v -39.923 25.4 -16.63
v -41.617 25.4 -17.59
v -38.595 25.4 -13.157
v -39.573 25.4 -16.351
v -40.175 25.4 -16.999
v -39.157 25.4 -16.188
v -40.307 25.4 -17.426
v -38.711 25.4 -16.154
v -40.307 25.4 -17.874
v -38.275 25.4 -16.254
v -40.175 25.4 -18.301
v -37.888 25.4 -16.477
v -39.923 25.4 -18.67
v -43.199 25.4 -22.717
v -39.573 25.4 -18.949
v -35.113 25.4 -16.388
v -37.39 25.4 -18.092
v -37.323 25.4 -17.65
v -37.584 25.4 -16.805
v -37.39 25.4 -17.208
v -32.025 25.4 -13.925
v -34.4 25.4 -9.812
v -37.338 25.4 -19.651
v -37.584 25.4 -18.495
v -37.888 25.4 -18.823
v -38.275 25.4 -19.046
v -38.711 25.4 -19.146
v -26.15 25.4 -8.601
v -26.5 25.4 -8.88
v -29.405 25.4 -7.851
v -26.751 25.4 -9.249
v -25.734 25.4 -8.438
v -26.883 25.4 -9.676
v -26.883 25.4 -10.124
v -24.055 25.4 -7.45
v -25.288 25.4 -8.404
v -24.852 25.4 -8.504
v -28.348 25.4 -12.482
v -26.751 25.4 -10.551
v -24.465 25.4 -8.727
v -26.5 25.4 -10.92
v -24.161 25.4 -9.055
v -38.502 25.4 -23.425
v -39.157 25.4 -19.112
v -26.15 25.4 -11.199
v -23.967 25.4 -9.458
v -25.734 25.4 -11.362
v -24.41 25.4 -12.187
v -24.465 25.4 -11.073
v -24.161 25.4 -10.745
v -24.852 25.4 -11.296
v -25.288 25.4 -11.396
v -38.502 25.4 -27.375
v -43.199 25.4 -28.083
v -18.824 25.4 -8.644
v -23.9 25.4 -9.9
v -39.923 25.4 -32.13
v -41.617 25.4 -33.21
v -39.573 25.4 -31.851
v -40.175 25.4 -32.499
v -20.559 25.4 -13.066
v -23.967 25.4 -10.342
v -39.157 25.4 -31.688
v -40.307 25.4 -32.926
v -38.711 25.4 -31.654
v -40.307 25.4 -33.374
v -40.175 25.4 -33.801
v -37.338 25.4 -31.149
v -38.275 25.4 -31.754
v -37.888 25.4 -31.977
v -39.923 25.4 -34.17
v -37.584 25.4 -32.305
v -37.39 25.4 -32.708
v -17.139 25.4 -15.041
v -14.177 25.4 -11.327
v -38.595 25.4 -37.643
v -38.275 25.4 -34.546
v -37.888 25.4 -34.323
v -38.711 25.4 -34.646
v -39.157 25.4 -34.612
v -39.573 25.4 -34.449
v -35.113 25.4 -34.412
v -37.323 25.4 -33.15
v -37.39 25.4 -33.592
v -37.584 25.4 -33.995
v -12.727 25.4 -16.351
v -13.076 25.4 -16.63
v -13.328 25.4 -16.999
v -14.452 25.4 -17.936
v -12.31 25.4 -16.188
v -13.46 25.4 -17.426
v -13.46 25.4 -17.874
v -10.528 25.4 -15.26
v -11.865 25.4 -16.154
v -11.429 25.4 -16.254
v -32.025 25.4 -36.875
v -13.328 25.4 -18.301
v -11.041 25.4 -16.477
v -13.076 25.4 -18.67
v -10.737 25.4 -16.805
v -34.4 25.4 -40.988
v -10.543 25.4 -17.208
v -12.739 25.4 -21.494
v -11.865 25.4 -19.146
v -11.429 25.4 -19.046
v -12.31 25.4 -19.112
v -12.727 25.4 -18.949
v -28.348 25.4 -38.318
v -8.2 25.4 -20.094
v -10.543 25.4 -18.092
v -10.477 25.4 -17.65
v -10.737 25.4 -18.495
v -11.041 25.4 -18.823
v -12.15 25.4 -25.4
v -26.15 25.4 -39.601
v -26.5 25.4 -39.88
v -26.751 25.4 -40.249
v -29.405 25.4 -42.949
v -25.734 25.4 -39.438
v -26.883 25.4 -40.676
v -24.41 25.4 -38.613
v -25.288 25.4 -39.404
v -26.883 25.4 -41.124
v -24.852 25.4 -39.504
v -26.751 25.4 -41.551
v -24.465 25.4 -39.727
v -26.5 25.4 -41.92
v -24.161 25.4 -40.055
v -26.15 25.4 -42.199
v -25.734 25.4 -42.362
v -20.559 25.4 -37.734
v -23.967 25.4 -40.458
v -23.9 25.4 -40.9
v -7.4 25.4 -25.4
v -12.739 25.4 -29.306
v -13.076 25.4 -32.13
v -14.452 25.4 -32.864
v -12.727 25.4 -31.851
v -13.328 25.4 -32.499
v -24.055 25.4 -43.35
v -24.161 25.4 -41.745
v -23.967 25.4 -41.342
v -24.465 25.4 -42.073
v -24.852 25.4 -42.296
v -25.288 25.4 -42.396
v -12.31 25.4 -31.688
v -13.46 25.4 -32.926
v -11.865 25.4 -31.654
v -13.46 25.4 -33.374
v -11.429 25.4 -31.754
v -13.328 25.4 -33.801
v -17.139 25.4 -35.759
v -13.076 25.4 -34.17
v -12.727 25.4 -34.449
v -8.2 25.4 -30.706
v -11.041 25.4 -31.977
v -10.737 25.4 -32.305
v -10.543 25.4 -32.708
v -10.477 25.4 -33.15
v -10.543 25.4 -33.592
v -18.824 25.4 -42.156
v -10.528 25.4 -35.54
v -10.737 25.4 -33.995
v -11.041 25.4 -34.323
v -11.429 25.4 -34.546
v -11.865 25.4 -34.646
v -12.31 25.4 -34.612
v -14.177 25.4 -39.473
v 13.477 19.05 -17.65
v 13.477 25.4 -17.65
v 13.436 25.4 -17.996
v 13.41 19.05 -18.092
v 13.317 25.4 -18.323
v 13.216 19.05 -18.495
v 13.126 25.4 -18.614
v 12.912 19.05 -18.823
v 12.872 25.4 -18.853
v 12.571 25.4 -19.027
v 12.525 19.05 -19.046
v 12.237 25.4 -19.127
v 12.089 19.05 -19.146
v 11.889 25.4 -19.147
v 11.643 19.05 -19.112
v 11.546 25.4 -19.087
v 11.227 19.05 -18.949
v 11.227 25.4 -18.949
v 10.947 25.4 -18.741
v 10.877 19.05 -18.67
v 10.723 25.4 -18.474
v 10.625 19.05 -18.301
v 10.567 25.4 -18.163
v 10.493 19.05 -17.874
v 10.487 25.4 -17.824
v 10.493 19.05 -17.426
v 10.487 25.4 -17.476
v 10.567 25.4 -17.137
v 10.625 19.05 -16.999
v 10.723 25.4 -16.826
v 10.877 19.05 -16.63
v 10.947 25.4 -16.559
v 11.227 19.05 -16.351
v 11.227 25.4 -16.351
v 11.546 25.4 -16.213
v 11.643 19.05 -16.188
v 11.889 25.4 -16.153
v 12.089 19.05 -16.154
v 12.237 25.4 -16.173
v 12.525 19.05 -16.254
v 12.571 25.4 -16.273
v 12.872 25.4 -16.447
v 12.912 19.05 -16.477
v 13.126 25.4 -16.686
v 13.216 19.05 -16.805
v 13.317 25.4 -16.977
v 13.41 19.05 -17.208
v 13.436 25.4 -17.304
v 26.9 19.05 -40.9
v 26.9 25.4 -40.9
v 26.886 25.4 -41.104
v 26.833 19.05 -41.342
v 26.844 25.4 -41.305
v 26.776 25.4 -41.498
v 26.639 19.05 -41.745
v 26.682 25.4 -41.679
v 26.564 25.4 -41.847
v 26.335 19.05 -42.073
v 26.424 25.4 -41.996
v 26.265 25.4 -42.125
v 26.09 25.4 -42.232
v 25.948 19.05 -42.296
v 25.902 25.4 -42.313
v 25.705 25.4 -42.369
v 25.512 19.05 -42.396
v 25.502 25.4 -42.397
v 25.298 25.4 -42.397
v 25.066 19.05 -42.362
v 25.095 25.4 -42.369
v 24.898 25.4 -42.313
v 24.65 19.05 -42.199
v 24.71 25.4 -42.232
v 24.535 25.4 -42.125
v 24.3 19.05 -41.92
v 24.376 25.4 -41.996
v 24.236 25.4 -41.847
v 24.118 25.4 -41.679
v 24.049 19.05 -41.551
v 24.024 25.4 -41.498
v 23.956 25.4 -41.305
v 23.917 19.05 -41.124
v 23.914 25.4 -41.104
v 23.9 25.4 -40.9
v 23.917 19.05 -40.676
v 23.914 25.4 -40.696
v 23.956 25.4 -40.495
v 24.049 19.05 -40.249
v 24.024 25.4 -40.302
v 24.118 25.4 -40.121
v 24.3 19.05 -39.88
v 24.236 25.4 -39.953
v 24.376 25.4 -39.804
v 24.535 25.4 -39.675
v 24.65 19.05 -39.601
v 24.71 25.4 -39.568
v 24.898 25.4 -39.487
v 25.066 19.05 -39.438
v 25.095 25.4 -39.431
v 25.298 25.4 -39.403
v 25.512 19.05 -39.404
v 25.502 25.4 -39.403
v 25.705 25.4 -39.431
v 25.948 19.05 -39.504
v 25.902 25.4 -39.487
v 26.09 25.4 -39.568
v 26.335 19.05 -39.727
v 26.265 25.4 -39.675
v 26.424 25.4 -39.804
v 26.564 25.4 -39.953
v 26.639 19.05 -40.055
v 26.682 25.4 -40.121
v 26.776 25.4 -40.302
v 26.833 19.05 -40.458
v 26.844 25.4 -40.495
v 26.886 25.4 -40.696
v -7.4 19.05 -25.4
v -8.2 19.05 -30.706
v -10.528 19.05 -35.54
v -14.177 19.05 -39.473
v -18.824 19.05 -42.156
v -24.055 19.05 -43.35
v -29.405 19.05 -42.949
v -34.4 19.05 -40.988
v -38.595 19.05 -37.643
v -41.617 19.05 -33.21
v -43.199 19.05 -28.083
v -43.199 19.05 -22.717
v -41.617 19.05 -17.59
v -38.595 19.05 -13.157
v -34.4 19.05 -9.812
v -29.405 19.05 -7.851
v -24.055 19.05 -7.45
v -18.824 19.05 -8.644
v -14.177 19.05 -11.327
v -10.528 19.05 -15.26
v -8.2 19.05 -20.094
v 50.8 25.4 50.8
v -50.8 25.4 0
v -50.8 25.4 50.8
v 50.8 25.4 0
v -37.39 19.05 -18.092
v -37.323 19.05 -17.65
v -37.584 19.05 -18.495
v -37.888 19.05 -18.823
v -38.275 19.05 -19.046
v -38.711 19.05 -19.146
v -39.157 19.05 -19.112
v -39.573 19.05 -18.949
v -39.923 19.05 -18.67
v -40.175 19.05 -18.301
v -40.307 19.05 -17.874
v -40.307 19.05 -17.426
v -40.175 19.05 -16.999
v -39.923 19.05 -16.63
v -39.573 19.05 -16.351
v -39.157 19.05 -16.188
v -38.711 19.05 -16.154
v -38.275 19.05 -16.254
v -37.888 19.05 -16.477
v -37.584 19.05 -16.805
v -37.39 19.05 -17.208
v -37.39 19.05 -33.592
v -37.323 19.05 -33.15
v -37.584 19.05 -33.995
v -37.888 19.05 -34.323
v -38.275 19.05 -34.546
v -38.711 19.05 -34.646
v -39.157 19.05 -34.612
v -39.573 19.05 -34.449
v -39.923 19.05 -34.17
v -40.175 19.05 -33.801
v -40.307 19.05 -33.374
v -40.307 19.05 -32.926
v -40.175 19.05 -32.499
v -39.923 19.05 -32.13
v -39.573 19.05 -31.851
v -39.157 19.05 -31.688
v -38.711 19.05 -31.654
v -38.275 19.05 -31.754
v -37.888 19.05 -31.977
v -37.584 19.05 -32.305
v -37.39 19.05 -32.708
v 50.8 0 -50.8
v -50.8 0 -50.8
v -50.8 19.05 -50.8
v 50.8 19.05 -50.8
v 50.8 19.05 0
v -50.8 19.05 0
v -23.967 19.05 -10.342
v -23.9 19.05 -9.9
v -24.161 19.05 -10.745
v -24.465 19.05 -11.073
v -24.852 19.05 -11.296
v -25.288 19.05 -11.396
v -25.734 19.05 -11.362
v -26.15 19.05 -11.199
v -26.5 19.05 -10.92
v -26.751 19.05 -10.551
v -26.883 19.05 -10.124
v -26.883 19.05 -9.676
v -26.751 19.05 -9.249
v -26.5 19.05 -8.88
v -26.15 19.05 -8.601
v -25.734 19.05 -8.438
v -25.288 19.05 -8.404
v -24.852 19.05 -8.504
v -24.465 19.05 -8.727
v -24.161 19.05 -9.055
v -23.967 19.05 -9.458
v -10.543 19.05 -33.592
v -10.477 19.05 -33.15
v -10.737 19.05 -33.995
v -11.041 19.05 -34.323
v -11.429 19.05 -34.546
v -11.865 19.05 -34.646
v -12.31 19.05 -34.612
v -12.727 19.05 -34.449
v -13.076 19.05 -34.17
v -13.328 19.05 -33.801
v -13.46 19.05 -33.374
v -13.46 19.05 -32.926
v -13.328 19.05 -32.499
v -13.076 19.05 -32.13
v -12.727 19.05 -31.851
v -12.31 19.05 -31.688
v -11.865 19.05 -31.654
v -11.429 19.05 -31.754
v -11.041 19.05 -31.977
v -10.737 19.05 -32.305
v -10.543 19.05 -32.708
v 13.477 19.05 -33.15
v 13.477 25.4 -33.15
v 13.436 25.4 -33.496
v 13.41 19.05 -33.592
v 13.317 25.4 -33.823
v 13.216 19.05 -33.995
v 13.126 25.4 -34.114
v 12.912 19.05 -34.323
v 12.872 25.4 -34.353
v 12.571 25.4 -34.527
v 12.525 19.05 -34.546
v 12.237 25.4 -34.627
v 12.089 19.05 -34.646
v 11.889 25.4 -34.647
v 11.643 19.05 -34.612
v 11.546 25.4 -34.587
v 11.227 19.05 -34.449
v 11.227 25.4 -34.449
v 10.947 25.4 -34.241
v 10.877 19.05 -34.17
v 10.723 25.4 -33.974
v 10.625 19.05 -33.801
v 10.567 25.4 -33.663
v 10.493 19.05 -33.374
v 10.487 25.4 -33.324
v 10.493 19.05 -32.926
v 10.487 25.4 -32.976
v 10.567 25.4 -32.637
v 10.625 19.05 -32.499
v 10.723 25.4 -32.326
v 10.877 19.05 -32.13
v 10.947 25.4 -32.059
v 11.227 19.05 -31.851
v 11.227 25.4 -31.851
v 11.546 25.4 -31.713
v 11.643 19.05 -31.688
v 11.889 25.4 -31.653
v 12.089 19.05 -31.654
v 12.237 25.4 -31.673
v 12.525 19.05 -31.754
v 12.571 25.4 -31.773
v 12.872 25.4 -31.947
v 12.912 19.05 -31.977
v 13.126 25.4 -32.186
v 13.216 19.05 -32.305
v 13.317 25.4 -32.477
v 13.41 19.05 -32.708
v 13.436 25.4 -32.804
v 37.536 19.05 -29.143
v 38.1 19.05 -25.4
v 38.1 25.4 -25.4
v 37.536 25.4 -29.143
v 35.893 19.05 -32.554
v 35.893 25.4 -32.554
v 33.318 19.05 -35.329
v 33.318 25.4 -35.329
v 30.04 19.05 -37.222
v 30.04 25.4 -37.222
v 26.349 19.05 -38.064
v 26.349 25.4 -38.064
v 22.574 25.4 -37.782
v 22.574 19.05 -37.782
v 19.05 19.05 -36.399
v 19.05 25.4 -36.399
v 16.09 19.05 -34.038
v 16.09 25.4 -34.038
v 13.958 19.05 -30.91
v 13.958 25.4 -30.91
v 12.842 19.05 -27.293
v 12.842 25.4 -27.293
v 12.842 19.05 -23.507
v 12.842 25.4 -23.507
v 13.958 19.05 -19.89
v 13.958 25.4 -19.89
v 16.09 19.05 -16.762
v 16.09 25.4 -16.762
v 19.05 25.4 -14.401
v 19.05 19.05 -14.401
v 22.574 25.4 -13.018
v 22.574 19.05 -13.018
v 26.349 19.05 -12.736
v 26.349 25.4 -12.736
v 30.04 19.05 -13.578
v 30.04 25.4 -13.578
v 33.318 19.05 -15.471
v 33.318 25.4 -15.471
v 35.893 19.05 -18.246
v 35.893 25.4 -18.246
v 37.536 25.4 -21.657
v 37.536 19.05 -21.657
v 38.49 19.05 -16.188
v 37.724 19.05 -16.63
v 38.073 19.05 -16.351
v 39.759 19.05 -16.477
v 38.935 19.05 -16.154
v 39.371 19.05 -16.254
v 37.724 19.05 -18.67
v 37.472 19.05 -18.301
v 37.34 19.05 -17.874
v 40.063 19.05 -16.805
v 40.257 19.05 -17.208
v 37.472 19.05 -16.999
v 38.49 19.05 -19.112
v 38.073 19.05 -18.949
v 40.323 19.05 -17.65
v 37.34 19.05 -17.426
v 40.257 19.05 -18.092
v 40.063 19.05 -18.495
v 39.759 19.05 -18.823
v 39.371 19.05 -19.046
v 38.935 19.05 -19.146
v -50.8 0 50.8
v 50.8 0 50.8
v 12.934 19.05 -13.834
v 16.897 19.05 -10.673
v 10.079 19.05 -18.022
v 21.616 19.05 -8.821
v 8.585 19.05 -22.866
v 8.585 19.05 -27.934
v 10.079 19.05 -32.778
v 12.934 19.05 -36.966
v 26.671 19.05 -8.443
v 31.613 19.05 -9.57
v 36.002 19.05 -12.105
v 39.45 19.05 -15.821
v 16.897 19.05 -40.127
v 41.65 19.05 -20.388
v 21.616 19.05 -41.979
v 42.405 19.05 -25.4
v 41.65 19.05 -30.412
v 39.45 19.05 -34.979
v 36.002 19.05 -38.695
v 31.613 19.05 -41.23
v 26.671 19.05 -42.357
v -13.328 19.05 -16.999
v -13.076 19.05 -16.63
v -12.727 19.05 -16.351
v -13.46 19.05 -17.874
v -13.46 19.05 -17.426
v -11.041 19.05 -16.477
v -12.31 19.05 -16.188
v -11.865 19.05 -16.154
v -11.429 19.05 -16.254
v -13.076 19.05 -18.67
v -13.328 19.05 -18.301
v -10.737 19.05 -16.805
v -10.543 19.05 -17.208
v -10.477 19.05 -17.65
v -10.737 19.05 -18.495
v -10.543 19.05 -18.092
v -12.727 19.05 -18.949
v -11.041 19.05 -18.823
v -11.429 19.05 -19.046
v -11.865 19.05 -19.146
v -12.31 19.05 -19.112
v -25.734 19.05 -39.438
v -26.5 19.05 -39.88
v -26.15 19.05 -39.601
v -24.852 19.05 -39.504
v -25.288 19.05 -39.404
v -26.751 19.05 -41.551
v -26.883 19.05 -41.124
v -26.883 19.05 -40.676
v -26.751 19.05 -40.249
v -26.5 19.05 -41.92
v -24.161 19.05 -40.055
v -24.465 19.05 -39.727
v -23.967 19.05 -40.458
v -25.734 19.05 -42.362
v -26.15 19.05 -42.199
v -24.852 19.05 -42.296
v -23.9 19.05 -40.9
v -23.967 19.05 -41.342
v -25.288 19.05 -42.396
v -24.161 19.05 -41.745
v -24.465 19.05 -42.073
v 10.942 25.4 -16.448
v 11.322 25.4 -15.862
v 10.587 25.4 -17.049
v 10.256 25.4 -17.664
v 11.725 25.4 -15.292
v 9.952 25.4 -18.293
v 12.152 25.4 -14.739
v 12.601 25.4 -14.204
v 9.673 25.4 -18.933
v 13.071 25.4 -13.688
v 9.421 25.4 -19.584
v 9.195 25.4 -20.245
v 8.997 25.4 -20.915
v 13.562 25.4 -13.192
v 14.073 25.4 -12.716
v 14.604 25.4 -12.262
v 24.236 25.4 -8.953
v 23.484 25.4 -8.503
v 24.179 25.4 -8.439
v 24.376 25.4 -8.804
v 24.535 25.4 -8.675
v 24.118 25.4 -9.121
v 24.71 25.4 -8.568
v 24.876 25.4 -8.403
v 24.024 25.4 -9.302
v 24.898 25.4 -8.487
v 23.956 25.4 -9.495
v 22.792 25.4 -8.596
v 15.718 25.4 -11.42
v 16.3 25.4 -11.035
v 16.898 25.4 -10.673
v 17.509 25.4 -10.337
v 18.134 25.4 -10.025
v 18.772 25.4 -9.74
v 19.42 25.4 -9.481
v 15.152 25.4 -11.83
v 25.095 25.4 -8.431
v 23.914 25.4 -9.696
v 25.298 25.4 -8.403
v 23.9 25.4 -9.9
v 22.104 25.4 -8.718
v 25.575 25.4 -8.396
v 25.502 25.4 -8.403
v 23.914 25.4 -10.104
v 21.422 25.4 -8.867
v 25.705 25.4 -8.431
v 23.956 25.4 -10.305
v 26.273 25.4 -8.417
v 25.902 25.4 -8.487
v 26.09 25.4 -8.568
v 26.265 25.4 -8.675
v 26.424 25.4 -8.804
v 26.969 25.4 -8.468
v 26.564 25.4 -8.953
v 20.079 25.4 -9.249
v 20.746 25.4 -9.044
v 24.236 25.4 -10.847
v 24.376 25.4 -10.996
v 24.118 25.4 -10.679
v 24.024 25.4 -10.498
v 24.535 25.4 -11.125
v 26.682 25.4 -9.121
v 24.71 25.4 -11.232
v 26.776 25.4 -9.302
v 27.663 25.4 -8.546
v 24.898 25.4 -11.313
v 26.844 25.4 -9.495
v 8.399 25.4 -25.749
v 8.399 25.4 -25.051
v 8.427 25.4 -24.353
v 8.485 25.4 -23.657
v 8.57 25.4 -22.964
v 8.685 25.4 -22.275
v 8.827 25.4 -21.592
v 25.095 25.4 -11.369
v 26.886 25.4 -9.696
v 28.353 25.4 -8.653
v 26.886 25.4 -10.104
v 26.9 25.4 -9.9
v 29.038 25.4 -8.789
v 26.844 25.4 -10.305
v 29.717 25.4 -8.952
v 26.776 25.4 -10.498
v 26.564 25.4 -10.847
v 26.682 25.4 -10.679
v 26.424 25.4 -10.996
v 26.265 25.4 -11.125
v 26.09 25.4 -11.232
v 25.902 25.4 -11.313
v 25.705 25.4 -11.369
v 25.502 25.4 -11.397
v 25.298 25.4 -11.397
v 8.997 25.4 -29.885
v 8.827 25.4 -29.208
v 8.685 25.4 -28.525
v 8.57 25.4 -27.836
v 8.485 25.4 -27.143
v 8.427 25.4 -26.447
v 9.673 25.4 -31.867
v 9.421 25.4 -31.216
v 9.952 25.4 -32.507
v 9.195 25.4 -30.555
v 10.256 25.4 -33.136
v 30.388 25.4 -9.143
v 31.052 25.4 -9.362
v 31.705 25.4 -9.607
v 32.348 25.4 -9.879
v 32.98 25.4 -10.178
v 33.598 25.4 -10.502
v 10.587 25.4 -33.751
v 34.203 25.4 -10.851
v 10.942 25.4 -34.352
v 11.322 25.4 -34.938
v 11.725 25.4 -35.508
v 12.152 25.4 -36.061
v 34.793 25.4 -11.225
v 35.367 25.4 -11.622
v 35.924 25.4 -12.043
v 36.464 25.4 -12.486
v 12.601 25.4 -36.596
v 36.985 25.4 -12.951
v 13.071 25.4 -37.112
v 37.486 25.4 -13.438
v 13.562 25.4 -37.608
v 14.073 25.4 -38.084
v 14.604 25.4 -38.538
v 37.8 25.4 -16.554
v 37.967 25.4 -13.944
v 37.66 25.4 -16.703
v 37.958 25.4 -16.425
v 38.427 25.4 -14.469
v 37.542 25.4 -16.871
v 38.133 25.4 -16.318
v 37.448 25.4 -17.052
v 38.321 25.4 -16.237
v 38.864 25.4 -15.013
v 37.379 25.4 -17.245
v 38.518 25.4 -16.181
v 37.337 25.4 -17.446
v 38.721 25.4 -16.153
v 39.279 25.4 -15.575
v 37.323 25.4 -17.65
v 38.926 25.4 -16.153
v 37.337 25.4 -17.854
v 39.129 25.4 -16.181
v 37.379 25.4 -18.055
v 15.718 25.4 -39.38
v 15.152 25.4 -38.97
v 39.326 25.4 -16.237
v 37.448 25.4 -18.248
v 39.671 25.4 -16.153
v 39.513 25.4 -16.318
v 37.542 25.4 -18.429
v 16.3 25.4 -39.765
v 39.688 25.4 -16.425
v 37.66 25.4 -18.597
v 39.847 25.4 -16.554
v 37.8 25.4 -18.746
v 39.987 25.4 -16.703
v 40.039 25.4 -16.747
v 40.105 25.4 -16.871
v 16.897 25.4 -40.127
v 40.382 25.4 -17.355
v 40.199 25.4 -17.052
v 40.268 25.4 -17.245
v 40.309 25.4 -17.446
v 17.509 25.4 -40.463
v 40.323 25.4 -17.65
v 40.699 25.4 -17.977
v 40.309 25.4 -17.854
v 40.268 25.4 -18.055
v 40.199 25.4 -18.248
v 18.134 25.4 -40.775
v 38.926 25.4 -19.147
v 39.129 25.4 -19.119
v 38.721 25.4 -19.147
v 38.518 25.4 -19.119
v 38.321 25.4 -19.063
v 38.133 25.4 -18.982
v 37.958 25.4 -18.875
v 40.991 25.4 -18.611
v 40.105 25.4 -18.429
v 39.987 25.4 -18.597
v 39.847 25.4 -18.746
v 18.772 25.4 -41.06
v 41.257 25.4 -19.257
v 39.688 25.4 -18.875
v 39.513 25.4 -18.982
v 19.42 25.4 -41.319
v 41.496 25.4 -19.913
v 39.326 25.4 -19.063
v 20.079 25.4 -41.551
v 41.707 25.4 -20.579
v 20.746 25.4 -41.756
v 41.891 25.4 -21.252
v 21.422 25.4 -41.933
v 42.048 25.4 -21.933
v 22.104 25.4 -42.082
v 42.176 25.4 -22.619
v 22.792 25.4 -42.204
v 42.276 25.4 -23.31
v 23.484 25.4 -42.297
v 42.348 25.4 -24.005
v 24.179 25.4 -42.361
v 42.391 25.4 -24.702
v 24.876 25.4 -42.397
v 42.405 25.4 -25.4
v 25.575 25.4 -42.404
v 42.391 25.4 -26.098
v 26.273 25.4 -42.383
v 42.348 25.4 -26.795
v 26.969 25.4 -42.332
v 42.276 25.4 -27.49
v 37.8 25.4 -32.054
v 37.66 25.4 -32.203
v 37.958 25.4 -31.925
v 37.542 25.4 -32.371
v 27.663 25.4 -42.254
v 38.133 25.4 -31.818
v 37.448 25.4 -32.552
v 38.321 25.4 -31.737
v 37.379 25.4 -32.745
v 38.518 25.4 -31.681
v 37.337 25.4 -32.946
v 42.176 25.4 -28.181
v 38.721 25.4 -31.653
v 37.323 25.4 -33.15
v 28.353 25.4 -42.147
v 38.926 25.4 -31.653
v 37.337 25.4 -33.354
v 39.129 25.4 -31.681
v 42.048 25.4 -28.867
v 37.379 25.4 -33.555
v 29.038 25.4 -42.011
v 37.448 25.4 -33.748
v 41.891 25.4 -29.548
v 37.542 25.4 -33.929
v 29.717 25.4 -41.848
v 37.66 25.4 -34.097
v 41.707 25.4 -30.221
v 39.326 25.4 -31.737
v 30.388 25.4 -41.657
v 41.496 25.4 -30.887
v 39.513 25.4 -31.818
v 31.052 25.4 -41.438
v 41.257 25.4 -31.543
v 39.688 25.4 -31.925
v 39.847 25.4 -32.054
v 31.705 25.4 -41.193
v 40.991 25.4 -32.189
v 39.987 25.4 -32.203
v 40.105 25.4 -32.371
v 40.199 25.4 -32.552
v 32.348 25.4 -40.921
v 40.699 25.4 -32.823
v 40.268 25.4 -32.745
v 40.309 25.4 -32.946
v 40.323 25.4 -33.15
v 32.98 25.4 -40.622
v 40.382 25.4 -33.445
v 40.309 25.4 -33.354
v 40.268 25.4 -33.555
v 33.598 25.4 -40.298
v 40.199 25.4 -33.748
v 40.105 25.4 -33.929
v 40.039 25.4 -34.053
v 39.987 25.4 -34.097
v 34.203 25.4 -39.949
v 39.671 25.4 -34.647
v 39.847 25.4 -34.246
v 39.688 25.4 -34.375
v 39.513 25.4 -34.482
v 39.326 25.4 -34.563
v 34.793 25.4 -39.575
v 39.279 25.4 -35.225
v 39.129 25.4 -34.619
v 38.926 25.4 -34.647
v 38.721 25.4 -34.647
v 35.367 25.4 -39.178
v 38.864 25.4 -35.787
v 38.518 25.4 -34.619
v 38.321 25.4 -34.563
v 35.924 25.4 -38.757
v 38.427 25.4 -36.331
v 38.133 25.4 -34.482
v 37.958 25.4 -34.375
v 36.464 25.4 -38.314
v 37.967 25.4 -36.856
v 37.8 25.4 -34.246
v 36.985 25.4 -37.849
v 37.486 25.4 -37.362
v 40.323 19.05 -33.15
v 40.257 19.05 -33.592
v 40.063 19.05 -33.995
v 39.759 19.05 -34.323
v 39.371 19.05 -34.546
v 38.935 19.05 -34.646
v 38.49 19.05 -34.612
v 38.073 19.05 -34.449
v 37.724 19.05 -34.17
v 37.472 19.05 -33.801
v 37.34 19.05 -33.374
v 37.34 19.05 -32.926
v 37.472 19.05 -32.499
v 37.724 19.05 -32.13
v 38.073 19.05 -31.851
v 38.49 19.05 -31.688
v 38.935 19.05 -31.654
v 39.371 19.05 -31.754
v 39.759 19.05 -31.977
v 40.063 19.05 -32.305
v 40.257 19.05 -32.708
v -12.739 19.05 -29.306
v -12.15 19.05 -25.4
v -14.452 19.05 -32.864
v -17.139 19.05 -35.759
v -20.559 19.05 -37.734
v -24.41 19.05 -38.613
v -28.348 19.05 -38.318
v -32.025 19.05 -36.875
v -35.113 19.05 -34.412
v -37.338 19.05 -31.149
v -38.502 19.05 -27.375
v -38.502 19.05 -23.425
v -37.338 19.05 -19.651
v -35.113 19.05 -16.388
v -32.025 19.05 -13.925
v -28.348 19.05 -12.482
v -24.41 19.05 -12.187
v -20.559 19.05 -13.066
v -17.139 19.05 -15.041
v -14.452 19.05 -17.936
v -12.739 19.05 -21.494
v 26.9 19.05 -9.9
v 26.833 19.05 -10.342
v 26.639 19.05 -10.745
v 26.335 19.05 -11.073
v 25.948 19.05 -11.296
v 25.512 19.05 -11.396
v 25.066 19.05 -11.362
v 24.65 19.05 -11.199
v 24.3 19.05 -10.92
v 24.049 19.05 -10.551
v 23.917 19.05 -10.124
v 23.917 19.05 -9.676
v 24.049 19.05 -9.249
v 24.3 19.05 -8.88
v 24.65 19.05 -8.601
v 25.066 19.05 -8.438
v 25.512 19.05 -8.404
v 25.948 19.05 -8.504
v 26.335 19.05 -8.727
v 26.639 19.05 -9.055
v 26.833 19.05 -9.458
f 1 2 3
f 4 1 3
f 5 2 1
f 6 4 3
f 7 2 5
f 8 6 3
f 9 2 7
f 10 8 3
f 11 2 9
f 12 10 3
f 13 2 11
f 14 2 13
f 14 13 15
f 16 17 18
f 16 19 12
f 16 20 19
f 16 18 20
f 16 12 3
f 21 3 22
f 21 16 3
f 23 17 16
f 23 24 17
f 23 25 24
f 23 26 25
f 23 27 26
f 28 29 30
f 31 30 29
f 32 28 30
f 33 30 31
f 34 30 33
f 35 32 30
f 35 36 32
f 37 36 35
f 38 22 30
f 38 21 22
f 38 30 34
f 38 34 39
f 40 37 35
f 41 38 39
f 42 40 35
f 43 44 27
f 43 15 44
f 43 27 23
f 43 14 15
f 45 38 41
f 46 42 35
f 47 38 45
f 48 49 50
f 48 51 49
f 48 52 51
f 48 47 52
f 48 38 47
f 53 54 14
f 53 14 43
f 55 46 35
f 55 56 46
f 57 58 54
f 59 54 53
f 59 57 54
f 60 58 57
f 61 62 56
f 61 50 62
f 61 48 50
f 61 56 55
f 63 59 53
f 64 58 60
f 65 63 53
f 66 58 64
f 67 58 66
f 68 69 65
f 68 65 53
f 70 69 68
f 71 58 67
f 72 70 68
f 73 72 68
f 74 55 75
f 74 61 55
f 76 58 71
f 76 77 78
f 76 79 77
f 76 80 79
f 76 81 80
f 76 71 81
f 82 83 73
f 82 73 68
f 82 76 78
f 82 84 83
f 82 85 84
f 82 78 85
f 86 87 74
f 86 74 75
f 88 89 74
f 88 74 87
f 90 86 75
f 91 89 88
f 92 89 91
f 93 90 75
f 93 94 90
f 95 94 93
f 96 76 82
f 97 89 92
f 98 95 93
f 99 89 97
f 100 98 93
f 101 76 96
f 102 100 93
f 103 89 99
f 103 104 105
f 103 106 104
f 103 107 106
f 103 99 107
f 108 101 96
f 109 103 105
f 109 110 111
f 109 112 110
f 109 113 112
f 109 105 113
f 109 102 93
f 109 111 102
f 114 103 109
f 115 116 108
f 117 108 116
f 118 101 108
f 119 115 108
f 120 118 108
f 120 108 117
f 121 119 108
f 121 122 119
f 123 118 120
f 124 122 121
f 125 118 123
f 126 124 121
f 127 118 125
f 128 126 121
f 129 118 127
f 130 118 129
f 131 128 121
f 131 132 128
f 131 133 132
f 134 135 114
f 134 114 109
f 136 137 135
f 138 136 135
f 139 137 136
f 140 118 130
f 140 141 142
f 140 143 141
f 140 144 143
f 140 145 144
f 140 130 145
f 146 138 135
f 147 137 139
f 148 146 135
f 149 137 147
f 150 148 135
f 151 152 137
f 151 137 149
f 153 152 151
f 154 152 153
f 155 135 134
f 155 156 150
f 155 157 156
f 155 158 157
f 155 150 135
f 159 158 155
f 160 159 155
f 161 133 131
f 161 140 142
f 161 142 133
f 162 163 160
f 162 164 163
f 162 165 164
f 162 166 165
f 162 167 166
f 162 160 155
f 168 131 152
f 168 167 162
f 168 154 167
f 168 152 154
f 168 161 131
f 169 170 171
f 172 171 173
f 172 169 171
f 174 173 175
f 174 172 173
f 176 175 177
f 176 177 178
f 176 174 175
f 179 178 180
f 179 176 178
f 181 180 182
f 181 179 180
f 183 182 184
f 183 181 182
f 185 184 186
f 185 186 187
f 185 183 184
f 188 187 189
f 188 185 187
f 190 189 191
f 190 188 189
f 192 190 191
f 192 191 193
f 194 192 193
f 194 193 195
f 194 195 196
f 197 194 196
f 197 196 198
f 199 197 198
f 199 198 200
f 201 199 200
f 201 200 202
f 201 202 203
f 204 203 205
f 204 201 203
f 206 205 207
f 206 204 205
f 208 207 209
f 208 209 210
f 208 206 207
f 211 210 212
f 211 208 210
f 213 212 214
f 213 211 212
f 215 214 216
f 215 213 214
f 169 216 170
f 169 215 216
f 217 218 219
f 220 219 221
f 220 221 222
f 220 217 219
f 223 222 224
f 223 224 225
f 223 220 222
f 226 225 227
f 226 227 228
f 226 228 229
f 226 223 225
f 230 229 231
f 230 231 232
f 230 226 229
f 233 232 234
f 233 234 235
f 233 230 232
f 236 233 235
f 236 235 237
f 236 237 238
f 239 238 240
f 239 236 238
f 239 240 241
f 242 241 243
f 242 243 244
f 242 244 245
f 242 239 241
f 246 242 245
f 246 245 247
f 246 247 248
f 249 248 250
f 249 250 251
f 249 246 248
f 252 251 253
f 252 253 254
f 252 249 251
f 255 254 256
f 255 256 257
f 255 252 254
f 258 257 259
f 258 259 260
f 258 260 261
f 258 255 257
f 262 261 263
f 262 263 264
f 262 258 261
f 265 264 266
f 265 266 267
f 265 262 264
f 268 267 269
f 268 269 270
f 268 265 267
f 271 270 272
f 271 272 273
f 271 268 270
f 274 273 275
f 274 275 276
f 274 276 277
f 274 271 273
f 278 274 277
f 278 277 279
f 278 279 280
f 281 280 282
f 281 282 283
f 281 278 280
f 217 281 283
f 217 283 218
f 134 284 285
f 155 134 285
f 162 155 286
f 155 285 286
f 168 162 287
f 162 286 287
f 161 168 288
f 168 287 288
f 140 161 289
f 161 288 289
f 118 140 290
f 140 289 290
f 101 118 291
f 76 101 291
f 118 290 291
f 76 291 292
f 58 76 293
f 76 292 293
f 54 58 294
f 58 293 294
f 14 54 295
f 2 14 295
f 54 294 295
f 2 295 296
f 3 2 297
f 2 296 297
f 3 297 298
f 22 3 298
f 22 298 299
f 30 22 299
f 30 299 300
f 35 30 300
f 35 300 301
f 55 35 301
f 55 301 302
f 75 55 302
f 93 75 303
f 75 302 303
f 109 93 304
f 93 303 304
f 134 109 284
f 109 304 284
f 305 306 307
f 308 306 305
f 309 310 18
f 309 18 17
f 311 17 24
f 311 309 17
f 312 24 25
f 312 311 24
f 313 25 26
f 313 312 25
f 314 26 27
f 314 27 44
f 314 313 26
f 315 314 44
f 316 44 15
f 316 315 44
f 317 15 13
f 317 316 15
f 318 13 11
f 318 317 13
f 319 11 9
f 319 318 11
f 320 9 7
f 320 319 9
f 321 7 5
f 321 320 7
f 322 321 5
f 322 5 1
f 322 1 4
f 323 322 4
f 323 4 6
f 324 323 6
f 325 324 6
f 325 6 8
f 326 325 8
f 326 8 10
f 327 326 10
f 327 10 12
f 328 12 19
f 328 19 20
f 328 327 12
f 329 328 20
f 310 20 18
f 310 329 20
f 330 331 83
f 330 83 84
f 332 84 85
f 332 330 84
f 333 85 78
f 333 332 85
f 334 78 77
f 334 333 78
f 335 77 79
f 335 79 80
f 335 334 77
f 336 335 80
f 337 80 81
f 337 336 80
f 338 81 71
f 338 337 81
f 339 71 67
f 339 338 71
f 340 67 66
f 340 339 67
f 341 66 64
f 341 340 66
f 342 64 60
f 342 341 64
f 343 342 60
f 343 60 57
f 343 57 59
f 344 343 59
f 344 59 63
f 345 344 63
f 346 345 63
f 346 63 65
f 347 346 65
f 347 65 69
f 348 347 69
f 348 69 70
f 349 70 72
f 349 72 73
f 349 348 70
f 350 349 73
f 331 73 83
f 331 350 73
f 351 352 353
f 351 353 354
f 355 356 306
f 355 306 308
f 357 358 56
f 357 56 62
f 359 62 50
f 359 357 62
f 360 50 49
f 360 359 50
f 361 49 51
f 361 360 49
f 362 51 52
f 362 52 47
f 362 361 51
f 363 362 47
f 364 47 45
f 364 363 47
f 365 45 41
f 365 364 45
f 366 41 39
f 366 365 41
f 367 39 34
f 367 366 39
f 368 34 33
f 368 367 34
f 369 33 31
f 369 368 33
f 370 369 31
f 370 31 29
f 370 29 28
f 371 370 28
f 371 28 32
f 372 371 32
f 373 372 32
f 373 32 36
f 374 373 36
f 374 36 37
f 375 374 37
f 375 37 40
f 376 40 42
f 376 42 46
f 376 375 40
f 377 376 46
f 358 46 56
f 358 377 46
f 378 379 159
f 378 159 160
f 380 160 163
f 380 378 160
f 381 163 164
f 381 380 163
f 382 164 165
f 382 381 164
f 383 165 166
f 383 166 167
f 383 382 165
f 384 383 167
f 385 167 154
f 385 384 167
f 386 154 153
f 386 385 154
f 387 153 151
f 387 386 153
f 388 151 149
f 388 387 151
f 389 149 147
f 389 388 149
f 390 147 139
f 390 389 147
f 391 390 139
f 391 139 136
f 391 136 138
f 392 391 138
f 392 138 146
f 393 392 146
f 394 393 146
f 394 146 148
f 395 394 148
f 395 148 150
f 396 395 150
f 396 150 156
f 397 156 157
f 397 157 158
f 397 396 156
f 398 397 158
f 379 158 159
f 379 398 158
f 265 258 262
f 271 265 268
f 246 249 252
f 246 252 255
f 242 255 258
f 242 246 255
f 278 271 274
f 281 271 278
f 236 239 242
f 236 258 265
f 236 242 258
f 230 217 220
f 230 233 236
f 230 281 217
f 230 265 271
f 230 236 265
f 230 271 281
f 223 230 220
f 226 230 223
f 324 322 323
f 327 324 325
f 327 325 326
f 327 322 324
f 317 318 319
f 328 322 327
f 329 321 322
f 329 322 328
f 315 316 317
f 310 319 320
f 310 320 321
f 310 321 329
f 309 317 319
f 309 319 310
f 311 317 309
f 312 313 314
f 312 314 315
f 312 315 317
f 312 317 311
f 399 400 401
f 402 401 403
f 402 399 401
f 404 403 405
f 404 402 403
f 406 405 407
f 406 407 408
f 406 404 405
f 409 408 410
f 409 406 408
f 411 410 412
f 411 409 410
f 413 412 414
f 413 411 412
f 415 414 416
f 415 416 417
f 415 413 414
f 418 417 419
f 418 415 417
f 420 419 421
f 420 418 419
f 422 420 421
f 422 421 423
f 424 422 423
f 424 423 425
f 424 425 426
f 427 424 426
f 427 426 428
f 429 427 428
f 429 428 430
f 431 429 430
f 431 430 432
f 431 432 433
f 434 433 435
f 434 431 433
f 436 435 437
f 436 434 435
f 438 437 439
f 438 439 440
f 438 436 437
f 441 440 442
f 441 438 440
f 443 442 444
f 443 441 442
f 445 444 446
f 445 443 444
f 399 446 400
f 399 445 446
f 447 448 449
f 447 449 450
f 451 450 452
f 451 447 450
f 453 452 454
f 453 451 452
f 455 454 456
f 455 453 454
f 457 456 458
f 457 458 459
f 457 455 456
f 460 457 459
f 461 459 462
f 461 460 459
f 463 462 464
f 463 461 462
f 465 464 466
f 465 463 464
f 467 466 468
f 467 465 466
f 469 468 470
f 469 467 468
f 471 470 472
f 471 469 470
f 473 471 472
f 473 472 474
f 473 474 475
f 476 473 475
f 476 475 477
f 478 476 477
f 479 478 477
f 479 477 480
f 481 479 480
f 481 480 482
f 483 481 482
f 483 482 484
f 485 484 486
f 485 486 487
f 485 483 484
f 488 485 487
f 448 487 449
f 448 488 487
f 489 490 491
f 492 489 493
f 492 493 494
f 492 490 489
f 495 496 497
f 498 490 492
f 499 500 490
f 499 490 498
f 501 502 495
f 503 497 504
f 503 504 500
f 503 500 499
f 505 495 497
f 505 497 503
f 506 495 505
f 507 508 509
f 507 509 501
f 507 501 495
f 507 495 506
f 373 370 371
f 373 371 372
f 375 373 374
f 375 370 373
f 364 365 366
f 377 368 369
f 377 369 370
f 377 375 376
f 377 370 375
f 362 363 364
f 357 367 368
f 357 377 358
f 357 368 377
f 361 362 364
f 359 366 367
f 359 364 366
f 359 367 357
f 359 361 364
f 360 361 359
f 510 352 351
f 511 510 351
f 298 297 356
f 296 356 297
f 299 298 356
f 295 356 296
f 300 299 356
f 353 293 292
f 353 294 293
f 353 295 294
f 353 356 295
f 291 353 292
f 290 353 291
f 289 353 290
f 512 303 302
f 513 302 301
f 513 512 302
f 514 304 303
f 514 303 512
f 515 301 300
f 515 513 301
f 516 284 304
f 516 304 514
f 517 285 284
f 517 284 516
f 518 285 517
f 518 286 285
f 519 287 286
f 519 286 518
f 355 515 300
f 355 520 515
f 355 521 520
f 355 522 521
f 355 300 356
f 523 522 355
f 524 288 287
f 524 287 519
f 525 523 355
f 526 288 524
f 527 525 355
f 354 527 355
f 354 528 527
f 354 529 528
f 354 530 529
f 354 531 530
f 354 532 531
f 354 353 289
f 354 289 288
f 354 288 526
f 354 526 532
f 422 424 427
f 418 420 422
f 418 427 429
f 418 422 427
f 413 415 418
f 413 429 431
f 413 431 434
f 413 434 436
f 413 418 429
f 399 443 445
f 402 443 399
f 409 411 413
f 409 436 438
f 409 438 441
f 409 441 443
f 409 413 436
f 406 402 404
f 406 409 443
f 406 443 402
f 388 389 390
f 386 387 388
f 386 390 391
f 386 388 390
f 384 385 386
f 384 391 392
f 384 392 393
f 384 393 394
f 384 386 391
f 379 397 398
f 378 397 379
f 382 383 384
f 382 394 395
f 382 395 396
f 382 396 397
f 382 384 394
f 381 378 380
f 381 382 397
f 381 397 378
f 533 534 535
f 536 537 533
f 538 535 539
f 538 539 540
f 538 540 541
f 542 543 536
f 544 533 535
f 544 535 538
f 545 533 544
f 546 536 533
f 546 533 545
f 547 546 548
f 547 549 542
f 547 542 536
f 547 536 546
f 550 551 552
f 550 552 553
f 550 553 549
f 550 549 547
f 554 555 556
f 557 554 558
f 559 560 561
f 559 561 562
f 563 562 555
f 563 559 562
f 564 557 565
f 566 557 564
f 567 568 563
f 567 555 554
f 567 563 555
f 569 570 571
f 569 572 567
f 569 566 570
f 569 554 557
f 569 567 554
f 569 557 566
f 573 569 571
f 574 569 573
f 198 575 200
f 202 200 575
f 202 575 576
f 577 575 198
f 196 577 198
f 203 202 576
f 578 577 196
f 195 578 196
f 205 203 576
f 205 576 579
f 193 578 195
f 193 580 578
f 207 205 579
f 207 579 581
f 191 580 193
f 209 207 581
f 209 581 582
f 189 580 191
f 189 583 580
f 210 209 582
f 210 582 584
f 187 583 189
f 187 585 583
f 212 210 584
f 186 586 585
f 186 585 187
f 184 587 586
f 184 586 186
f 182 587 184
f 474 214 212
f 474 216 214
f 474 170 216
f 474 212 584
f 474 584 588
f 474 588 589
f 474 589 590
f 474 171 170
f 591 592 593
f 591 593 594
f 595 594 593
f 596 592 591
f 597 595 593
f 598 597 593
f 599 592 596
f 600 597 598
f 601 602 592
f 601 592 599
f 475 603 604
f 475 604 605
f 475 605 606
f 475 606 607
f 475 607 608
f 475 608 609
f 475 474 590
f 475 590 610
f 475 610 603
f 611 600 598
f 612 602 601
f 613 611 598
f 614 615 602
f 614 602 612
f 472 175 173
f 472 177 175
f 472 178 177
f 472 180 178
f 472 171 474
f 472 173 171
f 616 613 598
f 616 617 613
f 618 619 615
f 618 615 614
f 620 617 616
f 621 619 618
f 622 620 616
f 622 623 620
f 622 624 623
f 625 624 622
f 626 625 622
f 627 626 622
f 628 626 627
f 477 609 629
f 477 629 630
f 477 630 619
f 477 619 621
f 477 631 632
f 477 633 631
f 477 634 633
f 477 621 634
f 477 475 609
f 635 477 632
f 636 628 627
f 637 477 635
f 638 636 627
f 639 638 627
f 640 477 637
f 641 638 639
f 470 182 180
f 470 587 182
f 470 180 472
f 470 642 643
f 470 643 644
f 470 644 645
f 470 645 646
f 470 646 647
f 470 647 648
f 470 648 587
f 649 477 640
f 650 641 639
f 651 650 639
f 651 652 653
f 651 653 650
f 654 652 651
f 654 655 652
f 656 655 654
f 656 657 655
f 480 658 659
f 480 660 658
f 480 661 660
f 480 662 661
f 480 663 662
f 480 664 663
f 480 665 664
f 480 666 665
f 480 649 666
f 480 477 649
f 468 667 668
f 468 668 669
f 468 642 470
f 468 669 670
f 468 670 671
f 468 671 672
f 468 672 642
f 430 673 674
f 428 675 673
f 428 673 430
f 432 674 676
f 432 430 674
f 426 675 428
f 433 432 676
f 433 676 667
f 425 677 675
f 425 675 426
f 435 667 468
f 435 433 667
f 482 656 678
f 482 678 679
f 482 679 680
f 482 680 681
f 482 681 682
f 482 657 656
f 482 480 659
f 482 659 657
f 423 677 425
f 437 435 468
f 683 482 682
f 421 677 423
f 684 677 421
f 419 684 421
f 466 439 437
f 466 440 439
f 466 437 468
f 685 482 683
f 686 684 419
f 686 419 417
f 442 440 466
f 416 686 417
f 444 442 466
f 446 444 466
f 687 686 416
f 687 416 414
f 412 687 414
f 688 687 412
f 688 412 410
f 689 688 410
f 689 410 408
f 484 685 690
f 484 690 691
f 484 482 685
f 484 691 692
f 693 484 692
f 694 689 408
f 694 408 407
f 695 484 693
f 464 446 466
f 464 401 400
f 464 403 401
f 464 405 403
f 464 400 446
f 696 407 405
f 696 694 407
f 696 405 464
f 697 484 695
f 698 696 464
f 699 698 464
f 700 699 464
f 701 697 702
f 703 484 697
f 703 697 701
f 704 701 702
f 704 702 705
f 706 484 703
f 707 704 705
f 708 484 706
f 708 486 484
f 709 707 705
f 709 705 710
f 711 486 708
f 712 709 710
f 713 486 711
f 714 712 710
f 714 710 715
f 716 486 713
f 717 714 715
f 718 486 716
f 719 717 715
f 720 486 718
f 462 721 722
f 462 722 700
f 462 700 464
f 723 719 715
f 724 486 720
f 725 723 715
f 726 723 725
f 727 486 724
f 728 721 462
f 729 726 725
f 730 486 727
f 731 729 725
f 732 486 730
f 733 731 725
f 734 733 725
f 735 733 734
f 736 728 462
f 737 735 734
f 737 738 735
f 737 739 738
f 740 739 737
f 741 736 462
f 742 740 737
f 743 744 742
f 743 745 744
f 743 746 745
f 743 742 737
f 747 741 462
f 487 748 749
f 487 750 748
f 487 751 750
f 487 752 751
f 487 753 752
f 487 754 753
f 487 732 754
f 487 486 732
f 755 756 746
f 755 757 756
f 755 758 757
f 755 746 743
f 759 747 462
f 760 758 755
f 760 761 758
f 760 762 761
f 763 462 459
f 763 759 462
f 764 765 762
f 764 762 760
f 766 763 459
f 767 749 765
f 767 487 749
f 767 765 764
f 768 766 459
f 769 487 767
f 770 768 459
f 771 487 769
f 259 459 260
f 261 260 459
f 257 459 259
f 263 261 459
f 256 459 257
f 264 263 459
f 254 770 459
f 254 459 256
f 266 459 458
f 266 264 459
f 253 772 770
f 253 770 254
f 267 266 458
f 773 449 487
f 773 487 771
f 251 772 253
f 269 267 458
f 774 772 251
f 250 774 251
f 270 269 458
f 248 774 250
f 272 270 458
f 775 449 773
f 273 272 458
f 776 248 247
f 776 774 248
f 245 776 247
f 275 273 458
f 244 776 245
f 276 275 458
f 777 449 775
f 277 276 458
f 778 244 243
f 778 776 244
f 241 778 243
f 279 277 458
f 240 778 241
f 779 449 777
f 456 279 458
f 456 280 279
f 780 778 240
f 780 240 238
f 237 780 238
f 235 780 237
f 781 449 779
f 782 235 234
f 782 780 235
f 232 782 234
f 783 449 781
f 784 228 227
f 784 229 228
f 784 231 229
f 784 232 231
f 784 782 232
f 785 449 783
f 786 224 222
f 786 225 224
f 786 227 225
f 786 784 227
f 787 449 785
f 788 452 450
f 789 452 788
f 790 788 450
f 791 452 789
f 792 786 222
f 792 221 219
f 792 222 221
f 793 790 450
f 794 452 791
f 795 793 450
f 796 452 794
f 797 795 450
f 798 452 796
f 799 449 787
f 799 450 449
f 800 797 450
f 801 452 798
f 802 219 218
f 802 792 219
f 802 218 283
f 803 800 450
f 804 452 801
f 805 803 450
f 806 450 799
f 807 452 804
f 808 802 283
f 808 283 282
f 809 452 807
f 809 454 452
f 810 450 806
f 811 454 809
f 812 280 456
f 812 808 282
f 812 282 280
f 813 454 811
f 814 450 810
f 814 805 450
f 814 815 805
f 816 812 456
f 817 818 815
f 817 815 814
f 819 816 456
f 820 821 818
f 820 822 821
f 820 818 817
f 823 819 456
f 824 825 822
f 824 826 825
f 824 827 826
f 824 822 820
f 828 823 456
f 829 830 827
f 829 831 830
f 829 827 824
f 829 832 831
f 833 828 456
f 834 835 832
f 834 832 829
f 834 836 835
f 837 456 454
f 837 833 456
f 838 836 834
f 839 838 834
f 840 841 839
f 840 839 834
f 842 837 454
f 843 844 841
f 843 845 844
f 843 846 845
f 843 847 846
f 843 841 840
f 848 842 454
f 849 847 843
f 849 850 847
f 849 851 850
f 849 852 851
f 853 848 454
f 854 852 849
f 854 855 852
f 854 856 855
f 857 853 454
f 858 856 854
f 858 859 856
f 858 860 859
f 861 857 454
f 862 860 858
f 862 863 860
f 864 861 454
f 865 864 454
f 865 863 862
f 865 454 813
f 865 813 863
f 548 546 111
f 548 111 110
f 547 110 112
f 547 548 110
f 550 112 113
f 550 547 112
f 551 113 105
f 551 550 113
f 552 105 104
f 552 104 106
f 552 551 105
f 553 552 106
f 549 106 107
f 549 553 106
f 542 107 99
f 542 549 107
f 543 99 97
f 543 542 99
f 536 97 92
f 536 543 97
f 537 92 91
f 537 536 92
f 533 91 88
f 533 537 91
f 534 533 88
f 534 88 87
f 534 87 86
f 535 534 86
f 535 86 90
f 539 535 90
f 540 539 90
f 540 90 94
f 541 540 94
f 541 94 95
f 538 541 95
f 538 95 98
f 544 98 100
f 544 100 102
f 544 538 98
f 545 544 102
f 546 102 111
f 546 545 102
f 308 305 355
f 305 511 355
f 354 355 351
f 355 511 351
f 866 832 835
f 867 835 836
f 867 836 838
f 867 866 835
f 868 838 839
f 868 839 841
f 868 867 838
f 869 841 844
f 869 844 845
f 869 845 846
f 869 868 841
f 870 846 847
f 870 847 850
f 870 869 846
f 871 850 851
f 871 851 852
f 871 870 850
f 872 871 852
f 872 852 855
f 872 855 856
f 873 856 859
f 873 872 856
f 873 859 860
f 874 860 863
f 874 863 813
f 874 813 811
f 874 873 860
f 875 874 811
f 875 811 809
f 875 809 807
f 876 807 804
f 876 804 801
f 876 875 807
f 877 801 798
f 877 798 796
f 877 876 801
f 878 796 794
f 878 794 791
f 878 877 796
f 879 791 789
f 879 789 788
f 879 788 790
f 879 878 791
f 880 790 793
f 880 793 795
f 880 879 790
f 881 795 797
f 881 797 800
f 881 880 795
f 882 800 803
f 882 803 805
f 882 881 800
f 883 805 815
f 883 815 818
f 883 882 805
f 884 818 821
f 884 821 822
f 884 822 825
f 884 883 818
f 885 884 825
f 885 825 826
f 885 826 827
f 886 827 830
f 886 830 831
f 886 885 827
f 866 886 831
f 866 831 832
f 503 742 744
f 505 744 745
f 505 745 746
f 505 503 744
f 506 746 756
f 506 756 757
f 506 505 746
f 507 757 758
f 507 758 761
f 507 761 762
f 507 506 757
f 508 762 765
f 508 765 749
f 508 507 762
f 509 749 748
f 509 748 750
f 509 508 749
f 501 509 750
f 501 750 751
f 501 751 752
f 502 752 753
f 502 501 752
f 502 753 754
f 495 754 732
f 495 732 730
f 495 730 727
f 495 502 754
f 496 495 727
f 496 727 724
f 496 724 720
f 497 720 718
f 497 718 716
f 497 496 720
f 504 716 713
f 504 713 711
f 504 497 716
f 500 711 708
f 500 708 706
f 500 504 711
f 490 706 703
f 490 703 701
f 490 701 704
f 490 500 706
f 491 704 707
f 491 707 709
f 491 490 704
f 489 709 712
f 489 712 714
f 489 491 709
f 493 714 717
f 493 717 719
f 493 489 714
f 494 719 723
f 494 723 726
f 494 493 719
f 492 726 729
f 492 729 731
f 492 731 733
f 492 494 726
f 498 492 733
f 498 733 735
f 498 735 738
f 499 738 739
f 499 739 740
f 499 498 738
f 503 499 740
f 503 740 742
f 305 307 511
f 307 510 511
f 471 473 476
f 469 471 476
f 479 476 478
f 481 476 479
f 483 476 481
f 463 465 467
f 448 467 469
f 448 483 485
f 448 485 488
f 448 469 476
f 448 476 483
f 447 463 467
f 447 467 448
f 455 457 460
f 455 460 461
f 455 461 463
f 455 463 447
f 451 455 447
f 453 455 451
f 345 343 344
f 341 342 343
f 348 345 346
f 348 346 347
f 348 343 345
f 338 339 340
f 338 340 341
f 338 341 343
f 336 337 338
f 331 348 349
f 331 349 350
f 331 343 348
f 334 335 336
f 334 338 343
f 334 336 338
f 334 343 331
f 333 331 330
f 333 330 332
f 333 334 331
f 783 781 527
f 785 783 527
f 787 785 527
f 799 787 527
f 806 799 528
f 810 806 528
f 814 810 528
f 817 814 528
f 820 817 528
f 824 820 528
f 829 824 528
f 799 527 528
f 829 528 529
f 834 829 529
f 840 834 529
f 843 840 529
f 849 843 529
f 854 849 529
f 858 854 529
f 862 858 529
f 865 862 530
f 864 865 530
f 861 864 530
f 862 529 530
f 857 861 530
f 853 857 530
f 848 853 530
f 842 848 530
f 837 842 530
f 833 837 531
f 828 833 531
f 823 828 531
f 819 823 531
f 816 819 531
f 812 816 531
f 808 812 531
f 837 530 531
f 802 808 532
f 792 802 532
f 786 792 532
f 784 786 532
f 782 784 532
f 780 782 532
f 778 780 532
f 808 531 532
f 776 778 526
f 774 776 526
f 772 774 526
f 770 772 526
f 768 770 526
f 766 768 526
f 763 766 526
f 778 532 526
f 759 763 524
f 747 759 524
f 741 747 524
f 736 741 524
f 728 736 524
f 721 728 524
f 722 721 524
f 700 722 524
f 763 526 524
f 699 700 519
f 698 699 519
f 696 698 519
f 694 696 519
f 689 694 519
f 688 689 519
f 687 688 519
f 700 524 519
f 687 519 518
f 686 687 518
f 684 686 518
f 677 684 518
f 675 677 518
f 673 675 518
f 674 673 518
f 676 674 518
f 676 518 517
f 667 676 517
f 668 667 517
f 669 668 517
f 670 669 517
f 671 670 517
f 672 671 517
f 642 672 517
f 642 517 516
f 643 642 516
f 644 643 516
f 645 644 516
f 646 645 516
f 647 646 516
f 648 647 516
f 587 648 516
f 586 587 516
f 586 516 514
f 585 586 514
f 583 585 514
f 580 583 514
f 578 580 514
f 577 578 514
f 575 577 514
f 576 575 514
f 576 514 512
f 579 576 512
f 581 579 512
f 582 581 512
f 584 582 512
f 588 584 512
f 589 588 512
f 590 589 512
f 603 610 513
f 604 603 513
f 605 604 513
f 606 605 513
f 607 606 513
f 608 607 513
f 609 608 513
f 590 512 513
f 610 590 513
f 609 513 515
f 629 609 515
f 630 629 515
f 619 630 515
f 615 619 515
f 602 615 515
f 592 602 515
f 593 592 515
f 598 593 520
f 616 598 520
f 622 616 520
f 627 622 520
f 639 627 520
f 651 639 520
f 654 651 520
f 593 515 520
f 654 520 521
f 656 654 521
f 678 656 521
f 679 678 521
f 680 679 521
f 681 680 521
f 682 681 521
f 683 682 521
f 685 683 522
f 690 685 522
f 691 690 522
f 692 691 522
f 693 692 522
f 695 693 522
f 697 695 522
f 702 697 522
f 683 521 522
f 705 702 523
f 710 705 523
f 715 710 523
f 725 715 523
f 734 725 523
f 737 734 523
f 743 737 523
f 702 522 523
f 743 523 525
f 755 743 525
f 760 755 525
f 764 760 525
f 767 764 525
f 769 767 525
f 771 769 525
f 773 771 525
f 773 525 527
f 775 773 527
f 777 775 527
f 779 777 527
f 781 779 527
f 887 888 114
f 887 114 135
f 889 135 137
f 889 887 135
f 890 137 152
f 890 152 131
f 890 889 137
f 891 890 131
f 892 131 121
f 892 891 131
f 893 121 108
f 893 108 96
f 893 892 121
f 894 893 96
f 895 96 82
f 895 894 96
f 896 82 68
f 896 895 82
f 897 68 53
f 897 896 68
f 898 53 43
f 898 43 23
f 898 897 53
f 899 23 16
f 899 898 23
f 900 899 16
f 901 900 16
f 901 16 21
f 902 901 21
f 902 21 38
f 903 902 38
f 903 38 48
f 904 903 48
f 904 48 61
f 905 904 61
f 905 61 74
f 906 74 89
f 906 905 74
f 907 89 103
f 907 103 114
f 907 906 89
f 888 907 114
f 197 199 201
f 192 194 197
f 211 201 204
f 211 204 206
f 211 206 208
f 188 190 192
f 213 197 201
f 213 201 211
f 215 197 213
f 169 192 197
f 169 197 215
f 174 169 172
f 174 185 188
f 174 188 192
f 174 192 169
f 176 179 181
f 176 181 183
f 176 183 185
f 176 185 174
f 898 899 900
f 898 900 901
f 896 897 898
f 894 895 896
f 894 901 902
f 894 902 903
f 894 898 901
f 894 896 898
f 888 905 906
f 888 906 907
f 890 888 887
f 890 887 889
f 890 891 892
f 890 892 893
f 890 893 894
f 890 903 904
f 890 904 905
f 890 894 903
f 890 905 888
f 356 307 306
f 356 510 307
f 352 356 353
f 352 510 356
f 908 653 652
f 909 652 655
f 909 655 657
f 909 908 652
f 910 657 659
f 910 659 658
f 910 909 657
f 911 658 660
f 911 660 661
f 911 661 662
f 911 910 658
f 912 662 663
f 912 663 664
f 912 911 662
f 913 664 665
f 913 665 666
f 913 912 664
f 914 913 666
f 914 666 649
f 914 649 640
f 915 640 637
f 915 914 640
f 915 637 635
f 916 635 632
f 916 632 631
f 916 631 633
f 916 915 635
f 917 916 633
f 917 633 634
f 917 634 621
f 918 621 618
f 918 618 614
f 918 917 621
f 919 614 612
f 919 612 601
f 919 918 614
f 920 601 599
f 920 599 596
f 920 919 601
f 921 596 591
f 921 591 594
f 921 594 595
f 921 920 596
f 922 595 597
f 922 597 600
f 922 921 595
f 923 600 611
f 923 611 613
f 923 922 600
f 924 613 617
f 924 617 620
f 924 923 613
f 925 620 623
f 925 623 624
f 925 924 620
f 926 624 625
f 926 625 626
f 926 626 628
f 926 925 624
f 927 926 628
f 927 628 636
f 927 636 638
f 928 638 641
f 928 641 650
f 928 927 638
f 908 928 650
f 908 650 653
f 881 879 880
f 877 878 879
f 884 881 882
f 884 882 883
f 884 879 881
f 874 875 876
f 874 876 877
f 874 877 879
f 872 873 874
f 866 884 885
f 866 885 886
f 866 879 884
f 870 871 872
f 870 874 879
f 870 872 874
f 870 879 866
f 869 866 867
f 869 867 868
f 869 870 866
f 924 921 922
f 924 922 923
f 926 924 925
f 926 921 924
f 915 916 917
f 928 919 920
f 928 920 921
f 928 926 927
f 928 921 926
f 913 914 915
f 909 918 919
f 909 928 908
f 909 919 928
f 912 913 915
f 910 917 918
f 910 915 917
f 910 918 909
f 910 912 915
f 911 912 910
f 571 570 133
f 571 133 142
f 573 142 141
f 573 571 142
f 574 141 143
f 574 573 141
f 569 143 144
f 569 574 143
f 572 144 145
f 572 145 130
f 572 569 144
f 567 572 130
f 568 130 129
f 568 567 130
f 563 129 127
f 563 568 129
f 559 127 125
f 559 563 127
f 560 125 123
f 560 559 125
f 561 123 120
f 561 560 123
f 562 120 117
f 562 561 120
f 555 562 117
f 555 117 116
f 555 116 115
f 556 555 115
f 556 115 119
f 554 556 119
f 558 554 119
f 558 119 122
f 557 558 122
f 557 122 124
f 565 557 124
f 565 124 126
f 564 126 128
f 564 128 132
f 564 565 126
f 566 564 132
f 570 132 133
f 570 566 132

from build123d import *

# Parameters (mm, degrees)
SKETCH1_W           = 101.6
SKETCH1_H           = 101.6
BOSS_EXTRUDE1_DEPTH = 19.05
SKETCH2_R           = 18
SKETCH2_R_2         = 1.5
SKETCH2_R_3         = 13.25
SKETCH2_R_4         = 17.005
SKETCH2_R_5         = 12.7
BOSS_EXTRUDE2_DEPTH = 6.35
SKETCH3_W           = 101.6
SKETCH3_H           = 50.8
BOSS_EXTRUDE3_DEPTH = 6.35


with BuildPart() as part:
    # Sketch1 → Boss-Extrude1 (new body)
    with BuildSketch(Plane(origin=(0, 0, 0), x_dir=(1, 0, 0), z_dir=(0, 1, 0))):
        Rectangle(SKETCH1_W, SKETCH1_H)
    extrude(amount=BOSS_EXTRUDE1_DEPTH)

    # Sketch2 → Boss-Extrude2 (add)
    with BuildSketch(Plane(origin=(0, 19.05, 0), x_dir=(1, 0, 0), z_dir=(0, 1, 0))):
        with Locations((-25.4, 25.4)):
            Circle(SKETCH2_R)
        with Locations((-38.823393759, 33.15)):
            Circle(SKETCH2_R_2, mode=Mode.SUBTRACT)
        with Locations((-38.823393759, 17.65)):
            Circle(SKETCH2_R_2, mode=Mode.SUBTRACT)
        with Locations((-25.4, 9.9)):
            Circle(SKETCH2_R_2, mode=Mode.SUBTRACT)
        with Locations((-11.976606241, 17.65)):
            Circle(SKETCH2_R_2, mode=Mode.SUBTRACT)
        with Locations((-11.976606241, 33.15)):
            Circle(SKETCH2_R_2, mode=Mode.SUBTRACT)
        with Locations((-25.4, 40.9)):
            Circle(SKETCH2_R_2, mode=Mode.SUBTRACT)
        with Locations((-25.4, 25.4)):
            Circle(SKETCH2_R_3, mode=Mode.SUBTRACT)
        with Locations((25.4, 25.4)):
            Circle(SKETCH2_R_4)
        with Locations((11.976606241, 33.15)):
            Circle(SKETCH2_R_2, mode=Mode.SUBTRACT)
        with Locations((11.976606241, 17.65)):
            Circle(SKETCH2_R_2, mode=Mode.SUBTRACT)
        with Locations((25.4, 9.9)):
            Circle(SKETCH2_R_2, mode=Mode.SUBTRACT)
        with Locations((38.823393759, 17.65)):
            Circle(SKETCH2_R_2, mode=Mode.SUBTRACT)
        with Locations((38.823393759, 33.15)):
            Circle(SKETCH2_R_2, mode=Mode.SUBTRACT)
        with Locations((25.4, 40.9)):
            Circle(SKETCH2_R_2, mode=Mode.SUBTRACT)
        with Locations((25.4, 25.4)):
            Circle(SKETCH2_R_5, mode=Mode.SUBTRACT)
    extrude(amount=BOSS_EXTRUDE2_DEPTH)

    # Sketch3 → Boss-Extrude3 (add)
    with BuildSketch(Plane(origin=(0, 19.05, 0), x_dir=(1, 0, 0), z_dir=(0, 1, 0))):
        with Locations((0, -25.4)):
            Rectangle(SKETCH3_W, SKETCH3_H)
    extrude(amount=BOSS_EXTRUDE3_DEPTH)


solid = part.part
